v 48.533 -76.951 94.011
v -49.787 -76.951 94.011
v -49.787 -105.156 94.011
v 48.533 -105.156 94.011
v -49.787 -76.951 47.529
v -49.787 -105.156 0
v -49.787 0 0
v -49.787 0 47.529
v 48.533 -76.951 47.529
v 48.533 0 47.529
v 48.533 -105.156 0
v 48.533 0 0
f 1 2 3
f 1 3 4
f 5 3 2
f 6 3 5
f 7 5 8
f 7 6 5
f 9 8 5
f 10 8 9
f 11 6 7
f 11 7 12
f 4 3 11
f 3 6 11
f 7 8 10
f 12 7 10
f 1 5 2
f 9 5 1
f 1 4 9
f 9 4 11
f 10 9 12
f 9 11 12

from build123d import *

# Parameters (mm, degrees)
F0_W     = 98.3195006847
F0_H     = 47.5294552743
F1_DEPTH = 105.156
F2_W     = 98.3195006847
F2_H     = 28.2054126678
F3_DEPTH = 46.482


with BuildPart() as f1:
    # F0 (on Front) → F1 (new body)
    with BuildSketch(Plane.XZ):
        with Locations((-0.6270371377, 23.7647276372)):
            Rectangle(F0_W, F0_H)
    extrude(amount=F1_DEPTH)

    # F2 (on face) → F3 (join)
    with BuildSketch(Plane.XY.offset(47.5294552743)):
        with Locations((-0.6270371377, -91.0532936661)):
            Rectangle(F2_W, F2_H)
    extrude(amount=F3_DEPTH)


solid = f1.part
